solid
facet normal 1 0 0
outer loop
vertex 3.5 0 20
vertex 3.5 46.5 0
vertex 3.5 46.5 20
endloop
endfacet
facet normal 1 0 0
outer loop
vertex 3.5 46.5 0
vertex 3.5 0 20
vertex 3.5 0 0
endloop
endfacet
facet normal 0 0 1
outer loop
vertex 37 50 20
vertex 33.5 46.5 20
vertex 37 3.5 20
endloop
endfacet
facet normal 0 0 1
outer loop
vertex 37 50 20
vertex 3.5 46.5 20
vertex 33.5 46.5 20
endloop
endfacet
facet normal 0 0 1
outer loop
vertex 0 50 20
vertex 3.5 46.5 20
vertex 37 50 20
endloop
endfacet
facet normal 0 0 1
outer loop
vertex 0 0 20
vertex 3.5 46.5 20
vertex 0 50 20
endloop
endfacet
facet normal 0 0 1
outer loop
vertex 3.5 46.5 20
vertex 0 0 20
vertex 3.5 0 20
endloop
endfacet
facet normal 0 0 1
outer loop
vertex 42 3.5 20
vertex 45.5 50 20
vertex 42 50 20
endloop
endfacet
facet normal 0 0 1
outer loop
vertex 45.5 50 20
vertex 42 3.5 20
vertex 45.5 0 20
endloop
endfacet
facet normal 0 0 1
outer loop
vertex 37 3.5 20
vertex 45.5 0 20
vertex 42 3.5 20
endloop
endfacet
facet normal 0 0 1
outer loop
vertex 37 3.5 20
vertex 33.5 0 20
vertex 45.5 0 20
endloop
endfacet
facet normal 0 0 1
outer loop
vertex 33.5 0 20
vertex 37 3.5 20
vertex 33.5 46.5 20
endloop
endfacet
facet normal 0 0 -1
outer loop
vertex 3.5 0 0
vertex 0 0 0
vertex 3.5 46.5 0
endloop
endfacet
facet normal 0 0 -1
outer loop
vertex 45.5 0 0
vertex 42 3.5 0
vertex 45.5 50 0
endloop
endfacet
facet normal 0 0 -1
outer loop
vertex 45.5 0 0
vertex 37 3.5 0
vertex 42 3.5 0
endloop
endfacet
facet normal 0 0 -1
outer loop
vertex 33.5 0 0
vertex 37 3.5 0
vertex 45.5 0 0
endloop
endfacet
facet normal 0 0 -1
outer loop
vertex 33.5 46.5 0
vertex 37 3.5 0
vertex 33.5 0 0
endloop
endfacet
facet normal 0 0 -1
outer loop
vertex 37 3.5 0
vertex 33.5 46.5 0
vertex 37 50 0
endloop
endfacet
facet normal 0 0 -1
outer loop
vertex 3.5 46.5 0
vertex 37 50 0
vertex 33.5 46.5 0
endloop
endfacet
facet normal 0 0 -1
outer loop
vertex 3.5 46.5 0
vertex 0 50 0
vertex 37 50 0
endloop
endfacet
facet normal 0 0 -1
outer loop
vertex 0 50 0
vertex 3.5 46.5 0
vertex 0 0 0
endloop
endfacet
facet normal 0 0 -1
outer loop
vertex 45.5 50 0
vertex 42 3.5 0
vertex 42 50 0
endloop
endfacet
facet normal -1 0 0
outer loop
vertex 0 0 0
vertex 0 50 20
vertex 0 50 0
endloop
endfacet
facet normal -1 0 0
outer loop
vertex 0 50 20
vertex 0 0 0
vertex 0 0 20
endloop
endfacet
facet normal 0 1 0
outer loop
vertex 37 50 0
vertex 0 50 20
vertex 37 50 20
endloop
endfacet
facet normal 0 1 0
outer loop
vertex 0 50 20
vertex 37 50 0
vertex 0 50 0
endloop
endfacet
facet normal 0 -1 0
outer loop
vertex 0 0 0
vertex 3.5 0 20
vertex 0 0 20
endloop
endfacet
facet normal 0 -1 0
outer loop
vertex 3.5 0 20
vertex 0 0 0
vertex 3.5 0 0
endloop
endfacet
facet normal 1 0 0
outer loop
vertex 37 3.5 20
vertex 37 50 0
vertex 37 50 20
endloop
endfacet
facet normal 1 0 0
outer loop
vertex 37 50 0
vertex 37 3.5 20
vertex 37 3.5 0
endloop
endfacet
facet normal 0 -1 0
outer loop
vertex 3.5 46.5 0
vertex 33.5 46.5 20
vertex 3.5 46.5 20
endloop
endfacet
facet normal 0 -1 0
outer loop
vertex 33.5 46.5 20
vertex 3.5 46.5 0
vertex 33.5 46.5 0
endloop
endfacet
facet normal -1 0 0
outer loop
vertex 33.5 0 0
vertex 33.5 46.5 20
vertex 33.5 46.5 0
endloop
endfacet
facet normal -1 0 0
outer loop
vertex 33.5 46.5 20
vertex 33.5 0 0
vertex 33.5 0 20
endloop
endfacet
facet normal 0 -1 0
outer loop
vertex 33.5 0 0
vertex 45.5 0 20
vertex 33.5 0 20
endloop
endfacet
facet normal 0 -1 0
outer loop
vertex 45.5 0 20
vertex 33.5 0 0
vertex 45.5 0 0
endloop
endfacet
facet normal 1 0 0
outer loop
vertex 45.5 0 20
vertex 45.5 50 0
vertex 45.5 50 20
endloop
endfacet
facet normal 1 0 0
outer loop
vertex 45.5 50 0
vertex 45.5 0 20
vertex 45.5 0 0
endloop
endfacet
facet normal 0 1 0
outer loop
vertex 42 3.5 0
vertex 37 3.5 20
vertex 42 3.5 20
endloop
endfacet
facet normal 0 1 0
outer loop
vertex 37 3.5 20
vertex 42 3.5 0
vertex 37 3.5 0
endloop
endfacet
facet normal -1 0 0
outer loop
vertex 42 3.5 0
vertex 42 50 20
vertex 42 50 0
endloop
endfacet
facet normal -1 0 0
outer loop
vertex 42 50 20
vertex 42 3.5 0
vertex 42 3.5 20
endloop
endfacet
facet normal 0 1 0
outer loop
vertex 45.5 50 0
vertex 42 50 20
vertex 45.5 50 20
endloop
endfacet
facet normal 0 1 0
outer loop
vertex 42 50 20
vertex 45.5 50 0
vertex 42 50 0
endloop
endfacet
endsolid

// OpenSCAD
//CUSTOMIZER VARIABLES
//	Width of the clip
width = 20;

//	Height of the clip
height = 50;

//	Thickness of the clip
thickness = 3.5;

//	Width of the first gap on the clip
gap1 = 30;

//	Width of the second gap on the clip
gap2 = 5;
//CUSTOMIZER VARIABLES END

//Z-CLIP
module zclip(w,h,t,d1,d2) {
	cube([t,h,w]);
	translate([t,h-t,0]) cube([d1+t,t,w]);
	translate([d1+t,0,0]) cube([t,h-t,w]);
	translate([d1+t+t,0,0]) cube([d2+t,t,w]);
	translate([d1+t+t+d2,t,0]) cube([t,h-t,w]);
}
zclip(width,height,thickness,gap1,gap2);
//Z-CLIP END
